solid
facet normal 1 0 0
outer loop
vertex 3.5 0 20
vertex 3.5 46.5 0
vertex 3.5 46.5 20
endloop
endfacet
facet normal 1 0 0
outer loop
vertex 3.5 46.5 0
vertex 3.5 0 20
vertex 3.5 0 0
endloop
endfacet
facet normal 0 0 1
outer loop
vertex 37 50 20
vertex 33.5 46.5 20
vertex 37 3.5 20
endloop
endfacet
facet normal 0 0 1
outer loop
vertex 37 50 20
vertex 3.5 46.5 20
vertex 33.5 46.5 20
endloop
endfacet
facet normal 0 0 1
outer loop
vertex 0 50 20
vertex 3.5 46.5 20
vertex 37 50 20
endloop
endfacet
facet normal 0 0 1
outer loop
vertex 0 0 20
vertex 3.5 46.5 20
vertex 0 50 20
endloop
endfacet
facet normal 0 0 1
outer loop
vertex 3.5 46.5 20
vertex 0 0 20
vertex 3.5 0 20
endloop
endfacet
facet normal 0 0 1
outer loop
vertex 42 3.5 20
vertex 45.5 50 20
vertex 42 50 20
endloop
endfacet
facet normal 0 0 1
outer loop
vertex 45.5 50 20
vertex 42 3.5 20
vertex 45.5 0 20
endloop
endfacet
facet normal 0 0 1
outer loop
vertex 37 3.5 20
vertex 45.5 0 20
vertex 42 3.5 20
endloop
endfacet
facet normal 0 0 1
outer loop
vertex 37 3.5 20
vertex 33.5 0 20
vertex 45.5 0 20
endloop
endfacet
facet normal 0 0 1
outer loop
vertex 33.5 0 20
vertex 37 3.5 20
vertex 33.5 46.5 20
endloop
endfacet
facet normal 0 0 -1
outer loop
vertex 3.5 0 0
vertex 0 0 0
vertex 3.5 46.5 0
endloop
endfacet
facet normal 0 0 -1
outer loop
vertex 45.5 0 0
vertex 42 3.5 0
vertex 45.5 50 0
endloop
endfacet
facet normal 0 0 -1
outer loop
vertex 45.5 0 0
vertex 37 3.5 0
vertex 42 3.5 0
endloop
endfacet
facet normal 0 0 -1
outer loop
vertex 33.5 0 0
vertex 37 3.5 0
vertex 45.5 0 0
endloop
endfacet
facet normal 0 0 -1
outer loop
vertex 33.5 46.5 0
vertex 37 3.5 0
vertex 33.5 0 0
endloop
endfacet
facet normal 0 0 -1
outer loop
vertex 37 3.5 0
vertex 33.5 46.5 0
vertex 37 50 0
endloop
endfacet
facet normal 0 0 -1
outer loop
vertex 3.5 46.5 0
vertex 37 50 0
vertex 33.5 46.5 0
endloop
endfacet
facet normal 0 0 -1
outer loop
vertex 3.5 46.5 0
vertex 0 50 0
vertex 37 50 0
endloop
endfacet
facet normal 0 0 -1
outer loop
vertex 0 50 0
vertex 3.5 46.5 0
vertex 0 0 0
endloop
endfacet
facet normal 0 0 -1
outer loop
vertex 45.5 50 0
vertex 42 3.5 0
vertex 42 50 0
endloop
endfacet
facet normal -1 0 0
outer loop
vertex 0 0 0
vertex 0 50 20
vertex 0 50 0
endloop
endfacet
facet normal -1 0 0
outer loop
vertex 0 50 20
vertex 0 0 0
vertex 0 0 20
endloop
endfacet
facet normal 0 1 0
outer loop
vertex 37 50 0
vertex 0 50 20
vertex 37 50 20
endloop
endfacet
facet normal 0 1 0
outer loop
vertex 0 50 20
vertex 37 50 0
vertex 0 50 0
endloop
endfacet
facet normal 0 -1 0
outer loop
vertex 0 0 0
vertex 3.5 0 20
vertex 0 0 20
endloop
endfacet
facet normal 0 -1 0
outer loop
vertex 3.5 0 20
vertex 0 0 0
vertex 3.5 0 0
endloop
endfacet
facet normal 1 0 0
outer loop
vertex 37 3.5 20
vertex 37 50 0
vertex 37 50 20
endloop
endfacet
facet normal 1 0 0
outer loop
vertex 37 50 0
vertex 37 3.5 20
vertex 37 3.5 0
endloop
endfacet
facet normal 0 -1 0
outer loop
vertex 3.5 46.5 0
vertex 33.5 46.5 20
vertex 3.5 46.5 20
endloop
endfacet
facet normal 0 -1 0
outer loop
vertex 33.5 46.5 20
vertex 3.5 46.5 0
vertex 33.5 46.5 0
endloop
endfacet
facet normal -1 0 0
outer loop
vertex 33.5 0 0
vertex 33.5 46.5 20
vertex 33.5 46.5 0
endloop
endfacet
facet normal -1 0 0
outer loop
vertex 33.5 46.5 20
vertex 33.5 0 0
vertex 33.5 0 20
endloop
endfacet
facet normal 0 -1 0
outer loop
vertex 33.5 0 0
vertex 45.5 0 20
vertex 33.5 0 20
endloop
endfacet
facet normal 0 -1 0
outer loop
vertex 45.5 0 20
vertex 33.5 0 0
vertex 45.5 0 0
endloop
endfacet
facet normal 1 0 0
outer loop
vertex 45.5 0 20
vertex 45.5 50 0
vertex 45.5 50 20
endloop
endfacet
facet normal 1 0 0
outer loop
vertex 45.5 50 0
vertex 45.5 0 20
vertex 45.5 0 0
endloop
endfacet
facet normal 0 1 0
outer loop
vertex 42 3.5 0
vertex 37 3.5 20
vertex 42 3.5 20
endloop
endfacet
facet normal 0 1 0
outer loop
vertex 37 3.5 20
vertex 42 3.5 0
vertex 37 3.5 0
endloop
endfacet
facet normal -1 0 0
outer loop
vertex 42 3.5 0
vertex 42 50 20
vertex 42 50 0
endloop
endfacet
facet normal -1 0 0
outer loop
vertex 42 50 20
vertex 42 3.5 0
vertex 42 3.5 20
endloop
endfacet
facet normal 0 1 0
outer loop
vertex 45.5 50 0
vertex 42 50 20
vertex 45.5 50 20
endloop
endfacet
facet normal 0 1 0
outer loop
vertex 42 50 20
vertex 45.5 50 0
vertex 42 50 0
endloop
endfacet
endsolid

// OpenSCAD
//CUSTOMIZER VARIABLES
//	Width of the clip
width = 20;

//	Height of the clip
height = 50;

//	Thickness of the clip
thickness = 3.5;

//	Width of the first gap on the clip
gap1 = 30;

//	Width of the second gap on the clip
gap2 = 5;
//CUSTOMIZER VARIABLES END

//Z-CLIP
module zclip(w,h,t,d1,d2) {
	cube([t,h,w]);
	translate([t,h-t,0]) cube([d1+t,t,w]);
	translate([d1+t,0,0]) cube([t,h-t,w]);
	translate([d1+t+t,0,0]) cube([d2+t,t,w]);
	translate([d1+t+t+d2,t,0]) cube([t,h-t,w]);
}
zclip(width,height,thickness,gap1,gap2);
//Z-CLIP END
